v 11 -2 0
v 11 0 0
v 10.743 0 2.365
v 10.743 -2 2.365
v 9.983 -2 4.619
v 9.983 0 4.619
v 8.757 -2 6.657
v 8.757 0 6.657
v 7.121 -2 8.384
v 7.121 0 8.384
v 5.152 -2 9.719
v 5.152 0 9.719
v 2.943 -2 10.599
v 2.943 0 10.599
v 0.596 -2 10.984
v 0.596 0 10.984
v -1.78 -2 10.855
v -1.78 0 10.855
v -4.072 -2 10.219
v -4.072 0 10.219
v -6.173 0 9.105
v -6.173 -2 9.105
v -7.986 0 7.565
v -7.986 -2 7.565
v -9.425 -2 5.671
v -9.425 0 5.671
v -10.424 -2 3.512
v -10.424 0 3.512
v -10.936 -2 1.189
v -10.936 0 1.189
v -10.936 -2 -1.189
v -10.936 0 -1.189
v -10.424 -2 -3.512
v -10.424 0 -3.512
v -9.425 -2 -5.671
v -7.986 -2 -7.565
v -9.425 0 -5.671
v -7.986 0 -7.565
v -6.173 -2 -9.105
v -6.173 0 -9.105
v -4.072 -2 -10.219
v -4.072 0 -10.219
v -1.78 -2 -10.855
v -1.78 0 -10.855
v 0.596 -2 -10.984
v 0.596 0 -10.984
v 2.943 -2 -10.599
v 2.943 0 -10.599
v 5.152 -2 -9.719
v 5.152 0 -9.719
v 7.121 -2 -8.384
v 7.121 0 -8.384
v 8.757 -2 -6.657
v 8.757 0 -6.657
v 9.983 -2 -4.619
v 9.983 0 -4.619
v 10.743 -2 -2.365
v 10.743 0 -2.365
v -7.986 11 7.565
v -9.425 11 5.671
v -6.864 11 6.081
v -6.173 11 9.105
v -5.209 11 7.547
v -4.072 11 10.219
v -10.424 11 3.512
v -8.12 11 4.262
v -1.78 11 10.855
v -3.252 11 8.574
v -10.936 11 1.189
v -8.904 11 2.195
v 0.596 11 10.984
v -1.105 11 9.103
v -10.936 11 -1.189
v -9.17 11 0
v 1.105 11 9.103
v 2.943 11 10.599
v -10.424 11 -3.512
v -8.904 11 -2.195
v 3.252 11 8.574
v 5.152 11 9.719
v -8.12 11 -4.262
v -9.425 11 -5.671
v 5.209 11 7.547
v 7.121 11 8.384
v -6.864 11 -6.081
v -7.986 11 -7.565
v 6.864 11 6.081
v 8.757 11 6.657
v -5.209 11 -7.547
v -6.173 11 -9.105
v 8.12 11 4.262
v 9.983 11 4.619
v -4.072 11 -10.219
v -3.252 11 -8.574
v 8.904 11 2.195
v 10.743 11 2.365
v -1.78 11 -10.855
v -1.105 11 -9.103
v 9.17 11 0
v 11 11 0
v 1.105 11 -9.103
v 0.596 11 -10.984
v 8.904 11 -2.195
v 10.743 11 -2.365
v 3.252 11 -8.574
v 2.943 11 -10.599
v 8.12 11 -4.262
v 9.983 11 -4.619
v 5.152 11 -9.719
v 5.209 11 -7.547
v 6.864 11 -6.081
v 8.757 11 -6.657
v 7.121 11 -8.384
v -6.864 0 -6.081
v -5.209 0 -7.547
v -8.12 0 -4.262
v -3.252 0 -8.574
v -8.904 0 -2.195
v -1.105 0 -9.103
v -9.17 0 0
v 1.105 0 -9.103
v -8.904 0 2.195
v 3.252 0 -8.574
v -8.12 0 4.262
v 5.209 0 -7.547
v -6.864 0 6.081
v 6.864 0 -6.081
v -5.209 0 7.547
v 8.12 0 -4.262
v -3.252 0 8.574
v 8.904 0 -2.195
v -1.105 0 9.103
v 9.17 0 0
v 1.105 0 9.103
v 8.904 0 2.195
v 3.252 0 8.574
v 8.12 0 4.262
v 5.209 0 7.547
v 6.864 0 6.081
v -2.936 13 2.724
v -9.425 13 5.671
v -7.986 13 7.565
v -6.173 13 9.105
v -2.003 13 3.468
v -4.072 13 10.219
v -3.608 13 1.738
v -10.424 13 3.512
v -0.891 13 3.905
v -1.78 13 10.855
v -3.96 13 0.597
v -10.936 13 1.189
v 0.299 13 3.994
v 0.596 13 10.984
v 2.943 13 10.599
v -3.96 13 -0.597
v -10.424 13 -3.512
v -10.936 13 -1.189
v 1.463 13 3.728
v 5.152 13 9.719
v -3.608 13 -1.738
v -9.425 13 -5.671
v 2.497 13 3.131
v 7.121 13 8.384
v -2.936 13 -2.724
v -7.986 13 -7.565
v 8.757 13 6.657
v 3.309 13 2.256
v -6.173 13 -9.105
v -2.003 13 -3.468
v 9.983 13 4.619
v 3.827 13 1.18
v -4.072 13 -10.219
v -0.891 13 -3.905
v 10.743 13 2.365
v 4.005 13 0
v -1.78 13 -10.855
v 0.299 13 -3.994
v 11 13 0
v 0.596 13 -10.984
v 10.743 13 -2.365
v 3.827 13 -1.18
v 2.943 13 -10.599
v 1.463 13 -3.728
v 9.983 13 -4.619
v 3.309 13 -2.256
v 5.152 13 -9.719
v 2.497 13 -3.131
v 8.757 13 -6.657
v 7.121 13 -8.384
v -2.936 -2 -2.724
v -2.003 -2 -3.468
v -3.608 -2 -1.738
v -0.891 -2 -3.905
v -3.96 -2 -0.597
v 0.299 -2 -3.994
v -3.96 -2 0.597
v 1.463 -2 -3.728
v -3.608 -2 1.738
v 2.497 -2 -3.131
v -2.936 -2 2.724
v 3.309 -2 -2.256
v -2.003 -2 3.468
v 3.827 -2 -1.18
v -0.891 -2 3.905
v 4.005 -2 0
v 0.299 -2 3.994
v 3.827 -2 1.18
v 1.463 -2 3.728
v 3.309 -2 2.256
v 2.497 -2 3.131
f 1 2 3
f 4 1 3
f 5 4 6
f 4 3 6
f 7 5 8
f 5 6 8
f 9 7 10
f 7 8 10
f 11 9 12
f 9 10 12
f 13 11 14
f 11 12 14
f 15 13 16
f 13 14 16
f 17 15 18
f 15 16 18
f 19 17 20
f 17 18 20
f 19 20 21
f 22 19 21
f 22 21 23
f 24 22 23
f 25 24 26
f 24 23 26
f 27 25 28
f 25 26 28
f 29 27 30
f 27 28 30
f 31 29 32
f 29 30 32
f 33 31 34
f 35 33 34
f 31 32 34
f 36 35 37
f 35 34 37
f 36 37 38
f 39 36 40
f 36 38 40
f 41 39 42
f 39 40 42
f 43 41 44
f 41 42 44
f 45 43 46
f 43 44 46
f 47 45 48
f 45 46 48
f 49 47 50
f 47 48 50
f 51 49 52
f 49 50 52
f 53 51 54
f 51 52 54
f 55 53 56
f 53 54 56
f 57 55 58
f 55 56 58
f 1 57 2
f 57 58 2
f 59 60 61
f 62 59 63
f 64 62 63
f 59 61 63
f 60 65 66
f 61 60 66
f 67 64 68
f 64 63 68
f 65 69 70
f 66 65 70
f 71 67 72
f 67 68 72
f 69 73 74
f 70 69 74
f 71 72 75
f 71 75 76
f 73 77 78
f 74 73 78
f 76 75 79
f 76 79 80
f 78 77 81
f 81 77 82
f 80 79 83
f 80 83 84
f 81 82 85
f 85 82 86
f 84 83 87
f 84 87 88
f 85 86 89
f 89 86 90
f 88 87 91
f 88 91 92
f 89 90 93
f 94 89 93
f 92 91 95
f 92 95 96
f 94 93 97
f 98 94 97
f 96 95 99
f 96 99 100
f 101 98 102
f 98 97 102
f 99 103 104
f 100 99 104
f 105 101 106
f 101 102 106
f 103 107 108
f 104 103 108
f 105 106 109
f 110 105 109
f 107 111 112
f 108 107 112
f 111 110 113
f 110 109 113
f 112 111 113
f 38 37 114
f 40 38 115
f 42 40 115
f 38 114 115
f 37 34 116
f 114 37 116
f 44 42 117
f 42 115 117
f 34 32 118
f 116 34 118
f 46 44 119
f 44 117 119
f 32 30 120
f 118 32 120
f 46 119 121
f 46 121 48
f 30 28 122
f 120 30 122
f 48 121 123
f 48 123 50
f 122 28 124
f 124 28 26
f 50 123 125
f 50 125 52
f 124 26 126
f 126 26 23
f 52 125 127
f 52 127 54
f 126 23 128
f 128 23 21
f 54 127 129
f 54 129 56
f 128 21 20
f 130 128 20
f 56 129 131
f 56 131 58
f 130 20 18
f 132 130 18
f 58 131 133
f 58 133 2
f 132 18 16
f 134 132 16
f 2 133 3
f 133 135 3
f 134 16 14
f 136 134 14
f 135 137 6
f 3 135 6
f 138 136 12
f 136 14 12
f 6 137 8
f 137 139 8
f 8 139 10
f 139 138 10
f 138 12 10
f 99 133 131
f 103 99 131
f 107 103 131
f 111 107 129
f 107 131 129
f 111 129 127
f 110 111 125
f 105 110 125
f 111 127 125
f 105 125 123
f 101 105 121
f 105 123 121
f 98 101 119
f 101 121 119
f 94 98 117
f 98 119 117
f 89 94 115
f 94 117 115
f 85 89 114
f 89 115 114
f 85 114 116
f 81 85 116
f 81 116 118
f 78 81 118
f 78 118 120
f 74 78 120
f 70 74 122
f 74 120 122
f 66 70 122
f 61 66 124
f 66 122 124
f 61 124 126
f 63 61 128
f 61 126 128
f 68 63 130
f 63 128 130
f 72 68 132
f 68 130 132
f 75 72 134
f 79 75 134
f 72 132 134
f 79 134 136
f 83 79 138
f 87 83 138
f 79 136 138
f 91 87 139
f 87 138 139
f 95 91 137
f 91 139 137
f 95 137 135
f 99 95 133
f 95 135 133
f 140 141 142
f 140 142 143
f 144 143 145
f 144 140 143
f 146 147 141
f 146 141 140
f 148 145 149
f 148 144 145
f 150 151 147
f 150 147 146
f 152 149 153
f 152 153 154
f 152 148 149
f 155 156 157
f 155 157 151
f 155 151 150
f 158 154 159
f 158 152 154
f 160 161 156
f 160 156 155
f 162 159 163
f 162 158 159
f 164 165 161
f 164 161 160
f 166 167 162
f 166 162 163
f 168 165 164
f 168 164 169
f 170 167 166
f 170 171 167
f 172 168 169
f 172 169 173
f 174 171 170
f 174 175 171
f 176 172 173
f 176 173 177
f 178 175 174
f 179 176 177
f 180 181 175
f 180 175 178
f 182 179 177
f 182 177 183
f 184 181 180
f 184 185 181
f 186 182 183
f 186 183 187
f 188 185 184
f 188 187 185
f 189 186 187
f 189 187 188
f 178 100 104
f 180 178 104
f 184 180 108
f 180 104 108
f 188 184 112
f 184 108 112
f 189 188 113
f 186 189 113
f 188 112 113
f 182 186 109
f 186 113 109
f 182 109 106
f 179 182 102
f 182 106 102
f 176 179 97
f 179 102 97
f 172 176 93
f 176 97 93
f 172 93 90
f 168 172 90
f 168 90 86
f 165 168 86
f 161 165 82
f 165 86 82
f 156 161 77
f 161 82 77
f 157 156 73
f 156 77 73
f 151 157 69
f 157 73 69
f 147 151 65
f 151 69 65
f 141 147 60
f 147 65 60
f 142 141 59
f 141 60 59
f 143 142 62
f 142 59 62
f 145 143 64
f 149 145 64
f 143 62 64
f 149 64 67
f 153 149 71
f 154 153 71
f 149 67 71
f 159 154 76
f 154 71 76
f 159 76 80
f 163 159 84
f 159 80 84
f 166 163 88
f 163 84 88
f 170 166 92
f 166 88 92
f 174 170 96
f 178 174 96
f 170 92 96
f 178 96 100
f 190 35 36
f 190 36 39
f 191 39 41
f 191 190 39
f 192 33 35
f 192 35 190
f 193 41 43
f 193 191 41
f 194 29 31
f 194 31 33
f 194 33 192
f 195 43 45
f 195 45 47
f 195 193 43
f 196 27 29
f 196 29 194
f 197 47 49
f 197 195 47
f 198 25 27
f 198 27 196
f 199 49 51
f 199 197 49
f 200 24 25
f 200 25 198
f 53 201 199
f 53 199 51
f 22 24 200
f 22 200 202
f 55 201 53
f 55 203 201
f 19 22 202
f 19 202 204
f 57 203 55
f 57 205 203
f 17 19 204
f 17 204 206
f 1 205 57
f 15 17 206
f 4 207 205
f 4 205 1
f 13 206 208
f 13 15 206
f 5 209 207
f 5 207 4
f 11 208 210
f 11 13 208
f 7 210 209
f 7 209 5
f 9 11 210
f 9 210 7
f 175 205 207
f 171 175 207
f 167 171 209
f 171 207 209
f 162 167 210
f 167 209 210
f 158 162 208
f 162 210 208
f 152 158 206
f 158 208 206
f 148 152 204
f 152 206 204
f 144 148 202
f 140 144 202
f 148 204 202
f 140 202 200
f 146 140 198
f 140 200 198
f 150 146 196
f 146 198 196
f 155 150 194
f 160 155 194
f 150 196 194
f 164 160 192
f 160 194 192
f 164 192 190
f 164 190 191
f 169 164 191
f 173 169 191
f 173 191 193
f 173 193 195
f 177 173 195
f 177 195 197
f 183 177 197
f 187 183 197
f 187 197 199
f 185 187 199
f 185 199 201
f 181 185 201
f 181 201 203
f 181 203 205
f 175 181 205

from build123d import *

# Parameters (mm, degrees)
SKETCH_1_R          = 9.17
EXTRUDE_2_DEPTH     = 11
SKETCH_3_R          = 11
EXTRUDE_3_DEPTH     = 2
SKETCH_4_R          = 11
EXTRUDE_4_DEPTH     = 2
SKETCH_5_R          = 4.005
CUT_EXTRUDE_2_DEPTH = 16


with BuildPart() as part:
    # 草图1 → 凸台-拉伸2 (new body)
    with BuildSketch(Plane(origin=(0, 0, 0), x_dir=(1, 0, 0), z_dir=(0, 1, 0))):
        Circle(SKETCH_1_R)
    extrude(amount=EXTRUDE_2_DEPTH)

    # 草图3 → 凸台-拉伸3 (add)
    with BuildSketch(Plane(origin=(0, 11, 0), x_dir=(1, 0, 0), z_dir=(0, 1, 0))):
        Circle(SKETCH_3_R)
    extrude(amount=EXTRUDE_3_DEPTH)

    # 草图4 → 凸台-拉伸4 (add)
    with BuildSketch(Plane.XZ):
        Circle(SKETCH_4_R)
    extrude(amount=EXTRUDE_4_DEPTH)

    # 草图5 → 切除-拉伸2 (cut, through all)
    with BuildSketch(Plane.XZ.offset(2)):
        Circle(SKETCH_5_R)
    extrude(amount=-CUT_EXTRUDE_2_DEPTH, mode=Mode.SUBTRACT)


solid = part.part
